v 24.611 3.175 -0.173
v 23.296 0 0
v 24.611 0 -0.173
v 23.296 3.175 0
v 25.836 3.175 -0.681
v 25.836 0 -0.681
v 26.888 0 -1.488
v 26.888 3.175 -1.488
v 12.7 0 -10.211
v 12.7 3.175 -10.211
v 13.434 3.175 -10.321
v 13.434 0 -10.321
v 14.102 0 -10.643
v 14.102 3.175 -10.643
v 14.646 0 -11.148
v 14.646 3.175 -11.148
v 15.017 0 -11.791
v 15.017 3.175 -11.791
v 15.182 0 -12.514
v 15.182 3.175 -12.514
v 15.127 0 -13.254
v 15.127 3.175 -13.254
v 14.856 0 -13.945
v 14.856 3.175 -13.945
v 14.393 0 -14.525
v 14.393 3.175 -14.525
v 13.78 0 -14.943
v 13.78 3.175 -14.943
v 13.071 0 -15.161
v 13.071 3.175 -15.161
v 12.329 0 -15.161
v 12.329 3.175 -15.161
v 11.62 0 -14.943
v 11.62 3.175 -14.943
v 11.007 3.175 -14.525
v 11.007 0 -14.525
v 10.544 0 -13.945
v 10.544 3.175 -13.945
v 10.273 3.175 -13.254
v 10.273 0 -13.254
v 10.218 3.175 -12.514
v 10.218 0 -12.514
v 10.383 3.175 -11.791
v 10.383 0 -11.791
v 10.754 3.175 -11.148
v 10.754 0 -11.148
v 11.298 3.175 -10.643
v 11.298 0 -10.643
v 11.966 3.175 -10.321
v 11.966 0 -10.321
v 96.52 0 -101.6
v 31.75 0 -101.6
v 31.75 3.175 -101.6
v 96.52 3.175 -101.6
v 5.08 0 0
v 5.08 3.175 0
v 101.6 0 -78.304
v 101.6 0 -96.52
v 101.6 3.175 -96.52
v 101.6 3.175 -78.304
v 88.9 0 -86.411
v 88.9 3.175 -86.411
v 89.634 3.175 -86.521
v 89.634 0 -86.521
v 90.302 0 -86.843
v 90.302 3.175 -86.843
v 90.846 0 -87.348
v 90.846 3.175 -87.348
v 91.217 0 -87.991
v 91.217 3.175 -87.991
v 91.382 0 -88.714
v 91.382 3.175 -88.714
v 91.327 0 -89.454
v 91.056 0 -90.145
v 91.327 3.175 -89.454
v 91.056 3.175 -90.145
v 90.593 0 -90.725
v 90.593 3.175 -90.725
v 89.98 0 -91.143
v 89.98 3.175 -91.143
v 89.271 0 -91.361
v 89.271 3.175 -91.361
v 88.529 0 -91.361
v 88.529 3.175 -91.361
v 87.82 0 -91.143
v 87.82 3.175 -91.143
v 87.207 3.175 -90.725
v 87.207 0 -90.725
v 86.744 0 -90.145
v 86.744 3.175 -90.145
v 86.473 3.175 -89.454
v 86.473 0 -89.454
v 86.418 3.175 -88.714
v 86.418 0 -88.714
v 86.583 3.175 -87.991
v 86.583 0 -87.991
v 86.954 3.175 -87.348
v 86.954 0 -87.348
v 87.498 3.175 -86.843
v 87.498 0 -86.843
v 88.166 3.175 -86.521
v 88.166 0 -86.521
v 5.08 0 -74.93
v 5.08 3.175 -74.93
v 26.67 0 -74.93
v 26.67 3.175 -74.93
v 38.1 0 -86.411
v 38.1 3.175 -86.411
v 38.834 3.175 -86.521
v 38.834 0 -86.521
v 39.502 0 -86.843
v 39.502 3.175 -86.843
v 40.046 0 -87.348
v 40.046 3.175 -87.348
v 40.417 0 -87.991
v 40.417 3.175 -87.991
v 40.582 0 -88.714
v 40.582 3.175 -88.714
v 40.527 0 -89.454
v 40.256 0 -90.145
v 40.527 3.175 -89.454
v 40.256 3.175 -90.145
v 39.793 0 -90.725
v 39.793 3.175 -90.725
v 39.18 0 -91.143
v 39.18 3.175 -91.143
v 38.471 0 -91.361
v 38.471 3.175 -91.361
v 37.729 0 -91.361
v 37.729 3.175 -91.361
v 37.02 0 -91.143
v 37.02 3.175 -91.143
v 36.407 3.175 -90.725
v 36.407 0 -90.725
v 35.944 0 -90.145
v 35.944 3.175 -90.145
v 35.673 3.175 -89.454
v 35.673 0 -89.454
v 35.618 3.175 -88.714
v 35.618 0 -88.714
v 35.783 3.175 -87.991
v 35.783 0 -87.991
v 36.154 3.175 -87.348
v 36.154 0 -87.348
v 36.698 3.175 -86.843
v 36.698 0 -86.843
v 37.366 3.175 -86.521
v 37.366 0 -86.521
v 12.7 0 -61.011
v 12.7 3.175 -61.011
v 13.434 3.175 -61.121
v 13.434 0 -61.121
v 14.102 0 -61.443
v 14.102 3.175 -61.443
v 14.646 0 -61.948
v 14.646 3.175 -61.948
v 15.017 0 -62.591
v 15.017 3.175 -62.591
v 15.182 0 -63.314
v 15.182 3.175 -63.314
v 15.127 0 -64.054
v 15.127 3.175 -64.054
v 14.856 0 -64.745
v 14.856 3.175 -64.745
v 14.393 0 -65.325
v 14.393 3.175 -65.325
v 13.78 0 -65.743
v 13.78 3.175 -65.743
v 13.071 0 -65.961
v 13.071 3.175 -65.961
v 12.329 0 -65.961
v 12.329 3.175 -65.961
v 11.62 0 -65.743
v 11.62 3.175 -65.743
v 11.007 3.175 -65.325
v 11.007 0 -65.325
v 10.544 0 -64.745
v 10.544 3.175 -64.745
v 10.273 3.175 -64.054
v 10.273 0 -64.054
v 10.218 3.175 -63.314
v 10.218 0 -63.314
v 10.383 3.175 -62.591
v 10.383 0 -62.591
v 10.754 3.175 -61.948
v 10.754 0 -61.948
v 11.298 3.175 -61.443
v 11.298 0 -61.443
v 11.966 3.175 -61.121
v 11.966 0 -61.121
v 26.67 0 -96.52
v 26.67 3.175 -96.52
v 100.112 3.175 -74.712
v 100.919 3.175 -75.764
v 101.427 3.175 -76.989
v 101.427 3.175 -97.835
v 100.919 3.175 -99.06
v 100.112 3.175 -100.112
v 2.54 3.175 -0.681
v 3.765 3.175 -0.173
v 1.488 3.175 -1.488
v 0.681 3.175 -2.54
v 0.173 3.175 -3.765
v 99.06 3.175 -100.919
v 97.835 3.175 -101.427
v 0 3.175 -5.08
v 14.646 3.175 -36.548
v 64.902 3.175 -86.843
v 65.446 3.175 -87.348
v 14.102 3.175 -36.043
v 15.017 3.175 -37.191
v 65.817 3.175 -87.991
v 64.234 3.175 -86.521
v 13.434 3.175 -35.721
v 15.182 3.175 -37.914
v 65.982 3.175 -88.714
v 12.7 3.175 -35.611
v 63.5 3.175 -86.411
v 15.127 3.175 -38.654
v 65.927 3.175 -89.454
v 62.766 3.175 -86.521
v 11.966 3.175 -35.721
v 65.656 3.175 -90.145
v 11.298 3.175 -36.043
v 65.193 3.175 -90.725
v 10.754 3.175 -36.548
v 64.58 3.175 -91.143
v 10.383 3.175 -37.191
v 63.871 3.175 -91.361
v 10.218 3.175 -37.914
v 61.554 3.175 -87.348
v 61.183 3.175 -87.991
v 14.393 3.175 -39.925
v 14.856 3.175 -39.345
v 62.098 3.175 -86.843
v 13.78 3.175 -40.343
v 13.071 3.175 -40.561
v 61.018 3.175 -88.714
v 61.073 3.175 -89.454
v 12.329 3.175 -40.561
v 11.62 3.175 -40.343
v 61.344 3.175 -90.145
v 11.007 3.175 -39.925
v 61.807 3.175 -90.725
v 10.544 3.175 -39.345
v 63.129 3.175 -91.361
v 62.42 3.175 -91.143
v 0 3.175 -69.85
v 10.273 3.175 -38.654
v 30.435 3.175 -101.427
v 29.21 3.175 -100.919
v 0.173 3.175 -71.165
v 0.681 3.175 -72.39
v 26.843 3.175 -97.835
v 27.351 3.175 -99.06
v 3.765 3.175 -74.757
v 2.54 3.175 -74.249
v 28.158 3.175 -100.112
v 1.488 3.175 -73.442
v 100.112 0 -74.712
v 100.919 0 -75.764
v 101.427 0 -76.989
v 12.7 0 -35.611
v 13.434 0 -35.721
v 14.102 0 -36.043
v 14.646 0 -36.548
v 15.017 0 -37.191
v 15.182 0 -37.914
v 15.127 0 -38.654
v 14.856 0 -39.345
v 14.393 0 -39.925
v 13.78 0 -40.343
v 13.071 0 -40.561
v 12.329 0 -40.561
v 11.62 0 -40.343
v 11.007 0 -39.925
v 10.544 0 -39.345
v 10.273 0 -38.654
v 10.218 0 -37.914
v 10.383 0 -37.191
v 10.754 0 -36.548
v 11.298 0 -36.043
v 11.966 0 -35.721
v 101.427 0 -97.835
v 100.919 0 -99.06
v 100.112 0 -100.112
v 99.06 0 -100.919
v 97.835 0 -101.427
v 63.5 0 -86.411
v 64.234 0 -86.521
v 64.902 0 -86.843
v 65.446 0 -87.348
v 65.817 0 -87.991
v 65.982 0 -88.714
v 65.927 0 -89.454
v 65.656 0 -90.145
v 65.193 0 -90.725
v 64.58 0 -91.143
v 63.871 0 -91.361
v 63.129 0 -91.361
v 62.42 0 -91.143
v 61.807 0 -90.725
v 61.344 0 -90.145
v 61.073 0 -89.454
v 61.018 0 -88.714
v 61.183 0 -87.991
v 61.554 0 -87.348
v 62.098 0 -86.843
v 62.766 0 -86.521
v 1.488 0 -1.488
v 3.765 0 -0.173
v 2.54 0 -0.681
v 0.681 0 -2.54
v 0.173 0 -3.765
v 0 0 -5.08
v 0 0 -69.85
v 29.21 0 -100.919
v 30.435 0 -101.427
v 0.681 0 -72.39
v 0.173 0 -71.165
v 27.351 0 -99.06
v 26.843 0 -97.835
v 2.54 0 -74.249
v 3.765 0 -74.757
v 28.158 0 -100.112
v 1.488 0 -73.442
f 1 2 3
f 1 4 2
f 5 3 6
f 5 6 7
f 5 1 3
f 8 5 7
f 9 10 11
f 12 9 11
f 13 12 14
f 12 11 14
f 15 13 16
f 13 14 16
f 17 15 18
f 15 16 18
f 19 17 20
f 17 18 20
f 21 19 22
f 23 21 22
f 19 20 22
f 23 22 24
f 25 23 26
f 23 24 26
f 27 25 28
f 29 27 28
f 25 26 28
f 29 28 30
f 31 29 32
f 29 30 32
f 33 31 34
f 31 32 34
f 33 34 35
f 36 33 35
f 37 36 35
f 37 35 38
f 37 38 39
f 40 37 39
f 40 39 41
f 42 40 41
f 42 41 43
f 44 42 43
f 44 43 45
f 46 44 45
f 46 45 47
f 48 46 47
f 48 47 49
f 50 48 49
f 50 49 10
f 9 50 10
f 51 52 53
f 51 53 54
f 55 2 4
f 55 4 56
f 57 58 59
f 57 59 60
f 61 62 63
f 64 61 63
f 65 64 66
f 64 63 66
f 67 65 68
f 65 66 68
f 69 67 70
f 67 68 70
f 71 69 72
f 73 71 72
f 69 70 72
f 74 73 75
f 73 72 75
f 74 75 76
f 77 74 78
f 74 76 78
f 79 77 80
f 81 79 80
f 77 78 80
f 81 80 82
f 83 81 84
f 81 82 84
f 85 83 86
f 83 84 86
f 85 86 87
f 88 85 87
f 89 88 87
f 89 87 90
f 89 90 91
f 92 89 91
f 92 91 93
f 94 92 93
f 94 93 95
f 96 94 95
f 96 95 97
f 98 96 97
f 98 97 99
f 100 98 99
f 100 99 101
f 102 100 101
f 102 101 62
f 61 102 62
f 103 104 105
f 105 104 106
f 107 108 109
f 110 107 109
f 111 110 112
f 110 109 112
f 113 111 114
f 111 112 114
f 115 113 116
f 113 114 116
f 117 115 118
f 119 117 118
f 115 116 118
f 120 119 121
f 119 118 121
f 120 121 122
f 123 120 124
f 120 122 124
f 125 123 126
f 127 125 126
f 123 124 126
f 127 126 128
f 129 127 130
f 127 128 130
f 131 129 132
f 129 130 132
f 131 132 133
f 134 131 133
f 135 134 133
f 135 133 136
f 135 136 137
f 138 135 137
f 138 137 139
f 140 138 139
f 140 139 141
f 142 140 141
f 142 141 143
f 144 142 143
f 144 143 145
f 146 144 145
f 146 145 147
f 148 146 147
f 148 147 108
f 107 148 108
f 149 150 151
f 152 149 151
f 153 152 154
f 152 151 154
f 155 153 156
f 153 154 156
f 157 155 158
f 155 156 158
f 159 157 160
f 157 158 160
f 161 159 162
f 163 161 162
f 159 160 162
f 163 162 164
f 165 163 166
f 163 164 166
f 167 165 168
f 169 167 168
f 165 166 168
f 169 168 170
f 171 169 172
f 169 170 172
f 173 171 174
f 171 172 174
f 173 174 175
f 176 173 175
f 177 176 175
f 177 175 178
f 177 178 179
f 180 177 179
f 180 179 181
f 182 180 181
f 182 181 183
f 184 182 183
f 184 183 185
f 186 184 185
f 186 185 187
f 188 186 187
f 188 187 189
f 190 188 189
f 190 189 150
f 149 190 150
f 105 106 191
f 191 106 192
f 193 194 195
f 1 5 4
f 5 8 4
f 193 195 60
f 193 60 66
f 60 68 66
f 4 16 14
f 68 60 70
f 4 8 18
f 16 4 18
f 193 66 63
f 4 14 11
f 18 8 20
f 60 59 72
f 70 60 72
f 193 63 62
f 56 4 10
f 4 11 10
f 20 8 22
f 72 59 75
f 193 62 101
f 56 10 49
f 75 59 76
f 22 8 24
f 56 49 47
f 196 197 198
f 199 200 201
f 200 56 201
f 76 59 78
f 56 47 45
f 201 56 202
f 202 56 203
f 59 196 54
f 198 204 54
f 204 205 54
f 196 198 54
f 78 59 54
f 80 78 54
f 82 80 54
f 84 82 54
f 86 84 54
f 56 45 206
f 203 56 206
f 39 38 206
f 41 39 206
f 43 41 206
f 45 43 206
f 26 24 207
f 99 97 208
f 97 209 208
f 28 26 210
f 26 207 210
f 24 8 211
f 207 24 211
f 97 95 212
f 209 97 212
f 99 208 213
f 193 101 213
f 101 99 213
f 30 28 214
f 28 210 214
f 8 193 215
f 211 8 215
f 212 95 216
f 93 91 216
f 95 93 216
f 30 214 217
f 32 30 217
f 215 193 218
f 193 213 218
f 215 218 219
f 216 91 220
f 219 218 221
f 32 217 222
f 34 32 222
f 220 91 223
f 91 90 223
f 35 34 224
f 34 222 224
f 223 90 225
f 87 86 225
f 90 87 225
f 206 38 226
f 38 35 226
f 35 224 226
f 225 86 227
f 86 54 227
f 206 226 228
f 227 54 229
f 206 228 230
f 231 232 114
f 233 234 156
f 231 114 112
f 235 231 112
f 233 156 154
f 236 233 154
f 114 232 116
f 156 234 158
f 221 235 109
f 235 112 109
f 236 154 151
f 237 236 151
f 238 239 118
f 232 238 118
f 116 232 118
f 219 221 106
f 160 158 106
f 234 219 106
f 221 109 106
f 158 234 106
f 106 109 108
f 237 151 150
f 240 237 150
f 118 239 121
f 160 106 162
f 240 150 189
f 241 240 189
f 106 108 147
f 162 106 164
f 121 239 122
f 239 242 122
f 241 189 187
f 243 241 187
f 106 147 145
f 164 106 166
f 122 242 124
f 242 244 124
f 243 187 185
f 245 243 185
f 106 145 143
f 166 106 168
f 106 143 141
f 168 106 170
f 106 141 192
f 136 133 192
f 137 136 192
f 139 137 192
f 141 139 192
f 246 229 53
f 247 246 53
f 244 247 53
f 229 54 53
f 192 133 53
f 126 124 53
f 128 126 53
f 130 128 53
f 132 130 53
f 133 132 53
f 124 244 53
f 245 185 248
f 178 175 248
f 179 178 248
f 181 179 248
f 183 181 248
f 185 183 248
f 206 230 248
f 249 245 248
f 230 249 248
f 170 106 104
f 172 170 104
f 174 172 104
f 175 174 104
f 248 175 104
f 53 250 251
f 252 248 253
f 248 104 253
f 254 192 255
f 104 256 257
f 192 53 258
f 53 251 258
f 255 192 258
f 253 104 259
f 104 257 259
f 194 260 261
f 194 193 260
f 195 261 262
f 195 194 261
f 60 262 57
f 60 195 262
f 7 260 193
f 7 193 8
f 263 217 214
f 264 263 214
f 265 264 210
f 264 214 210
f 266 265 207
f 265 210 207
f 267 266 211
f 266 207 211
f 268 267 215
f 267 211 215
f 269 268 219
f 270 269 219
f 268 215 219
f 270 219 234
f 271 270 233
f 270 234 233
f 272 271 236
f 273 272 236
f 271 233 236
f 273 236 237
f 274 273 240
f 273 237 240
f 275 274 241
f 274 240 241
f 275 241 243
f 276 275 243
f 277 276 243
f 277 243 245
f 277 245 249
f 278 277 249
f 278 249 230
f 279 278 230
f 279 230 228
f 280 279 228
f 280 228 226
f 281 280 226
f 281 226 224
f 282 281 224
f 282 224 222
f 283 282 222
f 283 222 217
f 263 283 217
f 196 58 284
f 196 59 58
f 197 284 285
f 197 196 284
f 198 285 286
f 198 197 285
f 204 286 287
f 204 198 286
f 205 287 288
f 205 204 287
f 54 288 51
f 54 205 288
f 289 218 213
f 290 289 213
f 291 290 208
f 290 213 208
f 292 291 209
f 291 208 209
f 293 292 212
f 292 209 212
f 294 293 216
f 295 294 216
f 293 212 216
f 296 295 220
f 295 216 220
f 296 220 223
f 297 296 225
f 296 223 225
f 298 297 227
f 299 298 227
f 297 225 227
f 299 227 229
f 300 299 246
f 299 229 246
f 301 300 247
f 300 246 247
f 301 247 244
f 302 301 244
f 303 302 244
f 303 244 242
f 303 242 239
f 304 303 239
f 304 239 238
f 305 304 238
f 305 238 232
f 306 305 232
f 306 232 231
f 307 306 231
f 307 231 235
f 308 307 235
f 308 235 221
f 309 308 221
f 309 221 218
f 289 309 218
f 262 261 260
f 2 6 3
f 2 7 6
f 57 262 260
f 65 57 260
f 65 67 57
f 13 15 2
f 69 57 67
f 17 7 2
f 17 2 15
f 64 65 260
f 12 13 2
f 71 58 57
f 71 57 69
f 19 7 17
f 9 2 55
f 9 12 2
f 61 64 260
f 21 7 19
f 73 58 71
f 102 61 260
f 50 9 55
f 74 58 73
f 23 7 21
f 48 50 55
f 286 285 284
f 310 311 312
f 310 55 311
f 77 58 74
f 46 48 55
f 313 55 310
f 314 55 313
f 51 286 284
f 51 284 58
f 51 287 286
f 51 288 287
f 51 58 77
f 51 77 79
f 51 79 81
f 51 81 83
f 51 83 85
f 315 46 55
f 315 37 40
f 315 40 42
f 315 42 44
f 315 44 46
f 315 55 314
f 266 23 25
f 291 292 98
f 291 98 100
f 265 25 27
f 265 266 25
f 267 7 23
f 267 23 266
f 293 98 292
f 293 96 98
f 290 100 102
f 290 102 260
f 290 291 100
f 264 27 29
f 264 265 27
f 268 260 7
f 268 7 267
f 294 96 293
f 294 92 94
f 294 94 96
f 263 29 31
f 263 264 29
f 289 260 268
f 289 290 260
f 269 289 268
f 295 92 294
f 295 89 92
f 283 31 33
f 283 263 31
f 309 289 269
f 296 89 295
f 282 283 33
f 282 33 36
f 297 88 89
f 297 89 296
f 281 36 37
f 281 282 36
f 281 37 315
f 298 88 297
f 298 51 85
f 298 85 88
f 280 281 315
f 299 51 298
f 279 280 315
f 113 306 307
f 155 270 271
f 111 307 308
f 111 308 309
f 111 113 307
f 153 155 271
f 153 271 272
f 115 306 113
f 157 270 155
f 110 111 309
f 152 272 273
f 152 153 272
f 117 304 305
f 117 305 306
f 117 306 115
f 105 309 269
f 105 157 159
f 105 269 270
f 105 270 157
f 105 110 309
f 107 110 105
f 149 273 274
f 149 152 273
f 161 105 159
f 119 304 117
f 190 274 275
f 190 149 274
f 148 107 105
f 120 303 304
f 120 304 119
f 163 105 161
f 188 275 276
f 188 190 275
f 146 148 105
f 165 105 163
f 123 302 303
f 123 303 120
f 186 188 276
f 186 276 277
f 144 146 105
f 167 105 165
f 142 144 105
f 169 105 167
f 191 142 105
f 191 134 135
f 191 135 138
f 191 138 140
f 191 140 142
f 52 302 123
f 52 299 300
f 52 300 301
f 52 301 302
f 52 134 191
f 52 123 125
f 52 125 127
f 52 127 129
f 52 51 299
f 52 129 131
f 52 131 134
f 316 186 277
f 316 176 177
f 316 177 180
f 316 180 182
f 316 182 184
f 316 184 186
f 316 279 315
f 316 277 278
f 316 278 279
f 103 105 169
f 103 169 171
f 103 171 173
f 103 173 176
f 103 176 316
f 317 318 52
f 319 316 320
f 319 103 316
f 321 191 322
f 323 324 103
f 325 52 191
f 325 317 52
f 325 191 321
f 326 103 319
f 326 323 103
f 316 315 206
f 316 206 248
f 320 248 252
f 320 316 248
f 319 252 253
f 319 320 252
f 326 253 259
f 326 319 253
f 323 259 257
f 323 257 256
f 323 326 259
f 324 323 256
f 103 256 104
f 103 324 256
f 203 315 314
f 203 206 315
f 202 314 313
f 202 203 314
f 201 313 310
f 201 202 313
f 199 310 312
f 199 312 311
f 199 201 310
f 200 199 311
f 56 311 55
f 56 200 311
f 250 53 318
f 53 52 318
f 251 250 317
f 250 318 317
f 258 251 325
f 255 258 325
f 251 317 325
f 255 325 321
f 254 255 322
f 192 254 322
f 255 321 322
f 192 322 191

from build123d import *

# Parameters (mm, degrees)
BOSS_EXTRUDE1_DEPTH = 3.175
SKETCH2_R           = 2.4892
CUT_EXTRUDE1_DEPTH  = 144.719172782
SKETCH3_W           = 26.67
SKETCH3_H           = 26.67
CUT_EXTRUDE2_DEPTH  = 144.719172782
FILLET1_R           = 5.08


with BuildPart() as part:
    # Sketch1 → Boss-Extrude1 (new body)
    with BuildSketch(Plane(origin=(0, 0, 0), x_dir=(1, 0, 0), z_dir=(0, 1, 0))):
        Polygon((0, 0), (0, 101.6), (101.6, 101.6), (101.6, 76.2), (25.4, 0), align=None)
    extrude(amount=BOSS_EXTRUDE1_DEPTH)

    # Sketch2 → Cut-Extrude1 (cut, through all)
    with BuildSketch(Plane(origin=(0, 3.175, 0), x_dir=(1, 0, 0), z_dir=(0, 1, 0))):
        with Locations(Location((12.7, 88.9, 0), (0, 0, 270))):
            Circle(SKETCH2_R)
        with Locations(Location((38.1, 88.9, 0), (0, 0, 270))):
            Circle(SKETCH2_R)
        with Locations(Location((63.5, 88.9, 0), (0, 0, 270))):
            Circle(SKETCH2_R)
        with Locations(Location((88.9, 88.9, 0), (0, 0, 270))):
            Circle(SKETCH2_R)
        with Locations(Location((12.7, 63.5, 0), (0, 0, 270))):
            Circle(SKETCH2_R)
        with Locations(Location((12.7, 38.1, 0), (0, 0, 270))):
            Circle(SKETCH2_R)
        with Locations(Location((12.7, 12.7, 0), (0, 0, 270))):
            Circle(SKETCH2_R)
    extrude(amount=-CUT_EXTRUDE1_DEPTH, mode=Mode.SUBTRACT)

    # Sketch3 → Cut-Extrude2 (cut, through all)
    with BuildSketch(Plane(origin=(0, 3.175, 0), x_dir=(1, 0, 0), z_dir=(0, 1, 0))):
        with Locations((13.335, 88.265)):
            Rectangle(SKETCH3_W, SKETCH3_H)
    extrude(amount=-CUT_EXTRUDE2_DEPTH, mode=Mode.SUBTRACT)

    # Fillet1
    fillet1_edges = [part.edges().sort_by_distance(p)[0] for p in [
        (0, 1.5875, -74.93),
        (26.67, 1.5875, -101.6),
        (0, 1.5875, 0),
        (101.6, 1.5875, -101.6),
        (101.6, 1.5875, -76.2),
        (25.4, 1.5875, 0),
    ]]
    fillet(fillet1_edges, radius=FILLET1_R)


solid = part.part
